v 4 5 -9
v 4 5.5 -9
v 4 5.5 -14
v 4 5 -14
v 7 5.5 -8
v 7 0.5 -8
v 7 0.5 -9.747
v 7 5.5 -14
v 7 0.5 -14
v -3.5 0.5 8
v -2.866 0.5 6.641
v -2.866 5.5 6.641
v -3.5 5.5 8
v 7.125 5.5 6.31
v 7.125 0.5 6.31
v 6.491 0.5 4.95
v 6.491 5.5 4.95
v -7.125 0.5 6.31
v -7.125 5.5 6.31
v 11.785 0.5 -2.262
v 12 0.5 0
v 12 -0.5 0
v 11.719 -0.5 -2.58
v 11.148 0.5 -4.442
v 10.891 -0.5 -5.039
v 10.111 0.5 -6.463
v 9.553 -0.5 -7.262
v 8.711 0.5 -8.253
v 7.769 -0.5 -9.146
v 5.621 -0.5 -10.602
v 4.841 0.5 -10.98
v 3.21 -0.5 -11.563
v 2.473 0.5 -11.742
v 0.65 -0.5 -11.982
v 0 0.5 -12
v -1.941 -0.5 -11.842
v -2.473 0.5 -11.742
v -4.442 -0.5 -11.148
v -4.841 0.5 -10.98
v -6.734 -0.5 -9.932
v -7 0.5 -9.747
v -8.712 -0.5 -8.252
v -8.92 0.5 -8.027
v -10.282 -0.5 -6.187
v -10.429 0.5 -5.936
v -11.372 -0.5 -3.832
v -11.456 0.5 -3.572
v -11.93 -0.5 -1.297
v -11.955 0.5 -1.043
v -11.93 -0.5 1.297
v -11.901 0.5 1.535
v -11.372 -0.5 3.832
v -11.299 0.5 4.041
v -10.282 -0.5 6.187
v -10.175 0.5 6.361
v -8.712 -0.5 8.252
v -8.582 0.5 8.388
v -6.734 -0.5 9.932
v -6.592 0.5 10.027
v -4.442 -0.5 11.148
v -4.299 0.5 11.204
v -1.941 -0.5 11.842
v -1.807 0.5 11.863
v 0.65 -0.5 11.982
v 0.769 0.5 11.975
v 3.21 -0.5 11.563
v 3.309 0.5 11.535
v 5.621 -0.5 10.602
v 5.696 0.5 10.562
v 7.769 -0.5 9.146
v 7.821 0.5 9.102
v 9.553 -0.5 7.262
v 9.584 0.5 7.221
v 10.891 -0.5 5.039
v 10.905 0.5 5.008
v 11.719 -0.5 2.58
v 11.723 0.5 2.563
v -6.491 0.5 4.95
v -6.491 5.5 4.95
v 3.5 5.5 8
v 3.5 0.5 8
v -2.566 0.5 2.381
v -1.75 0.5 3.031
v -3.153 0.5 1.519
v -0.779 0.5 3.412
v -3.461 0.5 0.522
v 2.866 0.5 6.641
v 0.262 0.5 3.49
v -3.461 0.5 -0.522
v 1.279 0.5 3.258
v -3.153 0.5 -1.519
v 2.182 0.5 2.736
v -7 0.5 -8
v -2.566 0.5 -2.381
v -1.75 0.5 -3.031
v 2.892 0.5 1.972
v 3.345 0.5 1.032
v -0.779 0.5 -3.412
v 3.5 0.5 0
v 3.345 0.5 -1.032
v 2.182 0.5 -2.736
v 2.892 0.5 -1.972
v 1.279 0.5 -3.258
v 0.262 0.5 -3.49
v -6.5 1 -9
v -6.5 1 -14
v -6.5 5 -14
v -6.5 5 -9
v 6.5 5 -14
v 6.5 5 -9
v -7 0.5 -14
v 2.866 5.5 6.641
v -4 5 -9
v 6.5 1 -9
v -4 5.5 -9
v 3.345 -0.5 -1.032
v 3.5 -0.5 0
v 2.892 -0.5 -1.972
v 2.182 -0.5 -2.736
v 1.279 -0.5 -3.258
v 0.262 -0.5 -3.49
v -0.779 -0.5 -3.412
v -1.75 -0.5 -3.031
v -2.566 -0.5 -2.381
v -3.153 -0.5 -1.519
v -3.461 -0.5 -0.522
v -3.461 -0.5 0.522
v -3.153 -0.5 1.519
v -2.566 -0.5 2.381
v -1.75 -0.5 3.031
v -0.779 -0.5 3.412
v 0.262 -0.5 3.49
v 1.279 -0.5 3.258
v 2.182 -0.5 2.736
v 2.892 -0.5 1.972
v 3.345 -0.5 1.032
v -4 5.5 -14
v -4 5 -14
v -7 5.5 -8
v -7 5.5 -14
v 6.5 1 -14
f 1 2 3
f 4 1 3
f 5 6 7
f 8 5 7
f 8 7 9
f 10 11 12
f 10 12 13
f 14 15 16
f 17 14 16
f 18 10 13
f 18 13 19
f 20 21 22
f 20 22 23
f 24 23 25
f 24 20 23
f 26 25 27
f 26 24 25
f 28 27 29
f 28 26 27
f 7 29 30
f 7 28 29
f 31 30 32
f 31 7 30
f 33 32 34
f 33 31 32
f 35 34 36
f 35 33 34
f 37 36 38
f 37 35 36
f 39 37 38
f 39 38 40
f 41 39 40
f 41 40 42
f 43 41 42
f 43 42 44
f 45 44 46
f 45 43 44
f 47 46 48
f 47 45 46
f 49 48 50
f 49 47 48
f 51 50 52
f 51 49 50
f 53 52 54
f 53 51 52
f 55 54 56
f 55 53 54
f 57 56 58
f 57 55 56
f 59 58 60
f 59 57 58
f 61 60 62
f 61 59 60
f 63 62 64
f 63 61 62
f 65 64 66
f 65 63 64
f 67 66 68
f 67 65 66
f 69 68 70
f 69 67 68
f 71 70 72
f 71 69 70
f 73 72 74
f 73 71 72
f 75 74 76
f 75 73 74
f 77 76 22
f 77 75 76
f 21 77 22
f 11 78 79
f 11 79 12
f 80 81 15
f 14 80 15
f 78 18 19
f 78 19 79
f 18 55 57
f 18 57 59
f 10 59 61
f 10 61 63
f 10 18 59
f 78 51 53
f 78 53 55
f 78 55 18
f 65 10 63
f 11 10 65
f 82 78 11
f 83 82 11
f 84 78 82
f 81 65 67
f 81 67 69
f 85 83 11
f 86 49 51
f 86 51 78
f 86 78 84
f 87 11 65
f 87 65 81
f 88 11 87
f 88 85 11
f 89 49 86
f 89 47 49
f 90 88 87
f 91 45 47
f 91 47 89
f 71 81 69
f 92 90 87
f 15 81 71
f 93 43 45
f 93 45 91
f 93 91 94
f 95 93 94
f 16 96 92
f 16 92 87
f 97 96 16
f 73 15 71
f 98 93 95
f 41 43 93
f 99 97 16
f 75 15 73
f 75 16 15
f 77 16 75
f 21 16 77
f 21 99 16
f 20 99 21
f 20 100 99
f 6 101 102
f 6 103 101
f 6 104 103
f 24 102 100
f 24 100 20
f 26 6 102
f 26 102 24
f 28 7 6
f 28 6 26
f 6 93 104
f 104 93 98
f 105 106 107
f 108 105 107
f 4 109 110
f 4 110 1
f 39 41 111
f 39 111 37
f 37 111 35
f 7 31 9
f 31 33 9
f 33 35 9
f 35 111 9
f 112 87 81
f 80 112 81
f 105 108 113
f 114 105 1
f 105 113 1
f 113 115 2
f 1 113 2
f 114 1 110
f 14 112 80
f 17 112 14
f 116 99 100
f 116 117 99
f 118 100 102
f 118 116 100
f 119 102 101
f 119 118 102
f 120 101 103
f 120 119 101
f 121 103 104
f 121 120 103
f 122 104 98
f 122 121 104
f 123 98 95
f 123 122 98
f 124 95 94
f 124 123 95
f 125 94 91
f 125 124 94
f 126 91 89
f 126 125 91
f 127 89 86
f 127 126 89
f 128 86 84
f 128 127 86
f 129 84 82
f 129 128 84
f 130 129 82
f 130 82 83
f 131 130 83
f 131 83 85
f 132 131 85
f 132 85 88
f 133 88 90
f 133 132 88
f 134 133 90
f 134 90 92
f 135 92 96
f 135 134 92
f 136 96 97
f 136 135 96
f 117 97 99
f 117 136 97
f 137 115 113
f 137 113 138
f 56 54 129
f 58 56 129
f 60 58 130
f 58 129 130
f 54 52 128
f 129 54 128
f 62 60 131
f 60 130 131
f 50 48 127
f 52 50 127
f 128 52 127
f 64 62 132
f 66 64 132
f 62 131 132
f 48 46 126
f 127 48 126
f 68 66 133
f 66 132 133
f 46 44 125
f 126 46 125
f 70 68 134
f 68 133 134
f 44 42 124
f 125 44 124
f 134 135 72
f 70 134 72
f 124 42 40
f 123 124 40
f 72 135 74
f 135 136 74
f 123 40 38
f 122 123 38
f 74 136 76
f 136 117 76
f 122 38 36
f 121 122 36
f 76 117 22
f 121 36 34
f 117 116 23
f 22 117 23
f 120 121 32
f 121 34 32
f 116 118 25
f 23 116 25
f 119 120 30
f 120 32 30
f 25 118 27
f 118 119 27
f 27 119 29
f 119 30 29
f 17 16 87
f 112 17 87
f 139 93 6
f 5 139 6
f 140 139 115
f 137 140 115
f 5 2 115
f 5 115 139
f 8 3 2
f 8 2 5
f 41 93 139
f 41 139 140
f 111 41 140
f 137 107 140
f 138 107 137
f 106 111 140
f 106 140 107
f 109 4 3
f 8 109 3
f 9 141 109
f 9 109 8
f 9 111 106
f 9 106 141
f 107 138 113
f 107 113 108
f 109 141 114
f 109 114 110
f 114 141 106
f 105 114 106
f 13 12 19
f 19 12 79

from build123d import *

# Parameters (mm, degrees)
SKETCH1_R           = 12
SKETCH1_R_2         = 3.5
BOSS_EXTRUDE1_DEPTH = 0.5
SKETCH2_W           = 14
SKETCH2_H           = 6
BOSS_EXTRUDE2_DEPTH = 5
SKETCH3_W           = 13
SKETCH3_H           = 4
CUT_EXTRUDE1_DEPTH  = 5
SKETCH4_W           = 8
SKETCH4_H           = 5
CUT_EXTRUDE2_DEPTH  = 4.5
BOSS_EXTRUDE3_DEPTH = 5


with BuildPart() as part:
    # Sketch1 → Boss-Extrude1 (new body, symmetric)
    with BuildSketch(Plane(origin=(0, 0, 0), x_dir=(1, 0, 0), z_dir=(0, 1, 0))):
        Circle(SKETCH1_R)
        Circle(SKETCH1_R_2, mode=Mode.SUBTRACT)
    extrude(amount=BOSS_EXTRUDE1_DEPTH, both=True)

    # Sketch2 → Boss-Extrude2 (add)
    with BuildSketch(Plane(origin=(0, 0.5, 0), x_dir=(1, 0, 0), z_dir=(0, 1, 0))):
        with Locations((0, 11)):
            Rectangle(SKETCH2_W, SKETCH2_H)
    extrude(amount=BOSS_EXTRUDE2_DEPTH)

    # Sketch3 → Cut-Extrude1 (cut)
    with BuildSketch(Plane(origin=(0, 0, -14), x_dir=(-1, 0, 0), z_dir=(0, 0, -1))):
        with Locations((0, 3)):
            Rectangle(SKETCH3_W, SKETCH3_H)
    extrude(amount=-CUT_EXTRUDE1_DEPTH, mode=Mode.SUBTRACT)

    # Sketch4 → Cut-Extrude2 (cut)
    with BuildSketch(Plane(origin=(0, 5.5, 0), x_dir=(1, 0, 0), z_dir=(0, 1, 0))):
        with Locations((0, 11.5)):
            Rectangle(SKETCH4_W, SKETCH4_H)
    extrude(amount=-CUT_EXTRUDE2_DEPTH, mode=Mode.SUBTRACT)

    # Sketch5 → Boss-Extrude3 (add)
    with BuildSketch(Plane(origin=(0, 0.5, 0), x_dir=(1, 0, 0), z_dir=(0, 1, 0))):
        Polygon((-6.491303756, -4.950065272), (-2.866072607, -6.640538319), (-3.5, -8), (-7.125231148, -6.309526953), align=None)
        Polygon((7.125231148, -6.309526953), (6.491303756, -4.950065272), (2.866072607, -6.640538319), (3.5, -8), align=None)
    extrude(amount=BOSS_EXTRUDE3_DEPTH)


solid = part.part
